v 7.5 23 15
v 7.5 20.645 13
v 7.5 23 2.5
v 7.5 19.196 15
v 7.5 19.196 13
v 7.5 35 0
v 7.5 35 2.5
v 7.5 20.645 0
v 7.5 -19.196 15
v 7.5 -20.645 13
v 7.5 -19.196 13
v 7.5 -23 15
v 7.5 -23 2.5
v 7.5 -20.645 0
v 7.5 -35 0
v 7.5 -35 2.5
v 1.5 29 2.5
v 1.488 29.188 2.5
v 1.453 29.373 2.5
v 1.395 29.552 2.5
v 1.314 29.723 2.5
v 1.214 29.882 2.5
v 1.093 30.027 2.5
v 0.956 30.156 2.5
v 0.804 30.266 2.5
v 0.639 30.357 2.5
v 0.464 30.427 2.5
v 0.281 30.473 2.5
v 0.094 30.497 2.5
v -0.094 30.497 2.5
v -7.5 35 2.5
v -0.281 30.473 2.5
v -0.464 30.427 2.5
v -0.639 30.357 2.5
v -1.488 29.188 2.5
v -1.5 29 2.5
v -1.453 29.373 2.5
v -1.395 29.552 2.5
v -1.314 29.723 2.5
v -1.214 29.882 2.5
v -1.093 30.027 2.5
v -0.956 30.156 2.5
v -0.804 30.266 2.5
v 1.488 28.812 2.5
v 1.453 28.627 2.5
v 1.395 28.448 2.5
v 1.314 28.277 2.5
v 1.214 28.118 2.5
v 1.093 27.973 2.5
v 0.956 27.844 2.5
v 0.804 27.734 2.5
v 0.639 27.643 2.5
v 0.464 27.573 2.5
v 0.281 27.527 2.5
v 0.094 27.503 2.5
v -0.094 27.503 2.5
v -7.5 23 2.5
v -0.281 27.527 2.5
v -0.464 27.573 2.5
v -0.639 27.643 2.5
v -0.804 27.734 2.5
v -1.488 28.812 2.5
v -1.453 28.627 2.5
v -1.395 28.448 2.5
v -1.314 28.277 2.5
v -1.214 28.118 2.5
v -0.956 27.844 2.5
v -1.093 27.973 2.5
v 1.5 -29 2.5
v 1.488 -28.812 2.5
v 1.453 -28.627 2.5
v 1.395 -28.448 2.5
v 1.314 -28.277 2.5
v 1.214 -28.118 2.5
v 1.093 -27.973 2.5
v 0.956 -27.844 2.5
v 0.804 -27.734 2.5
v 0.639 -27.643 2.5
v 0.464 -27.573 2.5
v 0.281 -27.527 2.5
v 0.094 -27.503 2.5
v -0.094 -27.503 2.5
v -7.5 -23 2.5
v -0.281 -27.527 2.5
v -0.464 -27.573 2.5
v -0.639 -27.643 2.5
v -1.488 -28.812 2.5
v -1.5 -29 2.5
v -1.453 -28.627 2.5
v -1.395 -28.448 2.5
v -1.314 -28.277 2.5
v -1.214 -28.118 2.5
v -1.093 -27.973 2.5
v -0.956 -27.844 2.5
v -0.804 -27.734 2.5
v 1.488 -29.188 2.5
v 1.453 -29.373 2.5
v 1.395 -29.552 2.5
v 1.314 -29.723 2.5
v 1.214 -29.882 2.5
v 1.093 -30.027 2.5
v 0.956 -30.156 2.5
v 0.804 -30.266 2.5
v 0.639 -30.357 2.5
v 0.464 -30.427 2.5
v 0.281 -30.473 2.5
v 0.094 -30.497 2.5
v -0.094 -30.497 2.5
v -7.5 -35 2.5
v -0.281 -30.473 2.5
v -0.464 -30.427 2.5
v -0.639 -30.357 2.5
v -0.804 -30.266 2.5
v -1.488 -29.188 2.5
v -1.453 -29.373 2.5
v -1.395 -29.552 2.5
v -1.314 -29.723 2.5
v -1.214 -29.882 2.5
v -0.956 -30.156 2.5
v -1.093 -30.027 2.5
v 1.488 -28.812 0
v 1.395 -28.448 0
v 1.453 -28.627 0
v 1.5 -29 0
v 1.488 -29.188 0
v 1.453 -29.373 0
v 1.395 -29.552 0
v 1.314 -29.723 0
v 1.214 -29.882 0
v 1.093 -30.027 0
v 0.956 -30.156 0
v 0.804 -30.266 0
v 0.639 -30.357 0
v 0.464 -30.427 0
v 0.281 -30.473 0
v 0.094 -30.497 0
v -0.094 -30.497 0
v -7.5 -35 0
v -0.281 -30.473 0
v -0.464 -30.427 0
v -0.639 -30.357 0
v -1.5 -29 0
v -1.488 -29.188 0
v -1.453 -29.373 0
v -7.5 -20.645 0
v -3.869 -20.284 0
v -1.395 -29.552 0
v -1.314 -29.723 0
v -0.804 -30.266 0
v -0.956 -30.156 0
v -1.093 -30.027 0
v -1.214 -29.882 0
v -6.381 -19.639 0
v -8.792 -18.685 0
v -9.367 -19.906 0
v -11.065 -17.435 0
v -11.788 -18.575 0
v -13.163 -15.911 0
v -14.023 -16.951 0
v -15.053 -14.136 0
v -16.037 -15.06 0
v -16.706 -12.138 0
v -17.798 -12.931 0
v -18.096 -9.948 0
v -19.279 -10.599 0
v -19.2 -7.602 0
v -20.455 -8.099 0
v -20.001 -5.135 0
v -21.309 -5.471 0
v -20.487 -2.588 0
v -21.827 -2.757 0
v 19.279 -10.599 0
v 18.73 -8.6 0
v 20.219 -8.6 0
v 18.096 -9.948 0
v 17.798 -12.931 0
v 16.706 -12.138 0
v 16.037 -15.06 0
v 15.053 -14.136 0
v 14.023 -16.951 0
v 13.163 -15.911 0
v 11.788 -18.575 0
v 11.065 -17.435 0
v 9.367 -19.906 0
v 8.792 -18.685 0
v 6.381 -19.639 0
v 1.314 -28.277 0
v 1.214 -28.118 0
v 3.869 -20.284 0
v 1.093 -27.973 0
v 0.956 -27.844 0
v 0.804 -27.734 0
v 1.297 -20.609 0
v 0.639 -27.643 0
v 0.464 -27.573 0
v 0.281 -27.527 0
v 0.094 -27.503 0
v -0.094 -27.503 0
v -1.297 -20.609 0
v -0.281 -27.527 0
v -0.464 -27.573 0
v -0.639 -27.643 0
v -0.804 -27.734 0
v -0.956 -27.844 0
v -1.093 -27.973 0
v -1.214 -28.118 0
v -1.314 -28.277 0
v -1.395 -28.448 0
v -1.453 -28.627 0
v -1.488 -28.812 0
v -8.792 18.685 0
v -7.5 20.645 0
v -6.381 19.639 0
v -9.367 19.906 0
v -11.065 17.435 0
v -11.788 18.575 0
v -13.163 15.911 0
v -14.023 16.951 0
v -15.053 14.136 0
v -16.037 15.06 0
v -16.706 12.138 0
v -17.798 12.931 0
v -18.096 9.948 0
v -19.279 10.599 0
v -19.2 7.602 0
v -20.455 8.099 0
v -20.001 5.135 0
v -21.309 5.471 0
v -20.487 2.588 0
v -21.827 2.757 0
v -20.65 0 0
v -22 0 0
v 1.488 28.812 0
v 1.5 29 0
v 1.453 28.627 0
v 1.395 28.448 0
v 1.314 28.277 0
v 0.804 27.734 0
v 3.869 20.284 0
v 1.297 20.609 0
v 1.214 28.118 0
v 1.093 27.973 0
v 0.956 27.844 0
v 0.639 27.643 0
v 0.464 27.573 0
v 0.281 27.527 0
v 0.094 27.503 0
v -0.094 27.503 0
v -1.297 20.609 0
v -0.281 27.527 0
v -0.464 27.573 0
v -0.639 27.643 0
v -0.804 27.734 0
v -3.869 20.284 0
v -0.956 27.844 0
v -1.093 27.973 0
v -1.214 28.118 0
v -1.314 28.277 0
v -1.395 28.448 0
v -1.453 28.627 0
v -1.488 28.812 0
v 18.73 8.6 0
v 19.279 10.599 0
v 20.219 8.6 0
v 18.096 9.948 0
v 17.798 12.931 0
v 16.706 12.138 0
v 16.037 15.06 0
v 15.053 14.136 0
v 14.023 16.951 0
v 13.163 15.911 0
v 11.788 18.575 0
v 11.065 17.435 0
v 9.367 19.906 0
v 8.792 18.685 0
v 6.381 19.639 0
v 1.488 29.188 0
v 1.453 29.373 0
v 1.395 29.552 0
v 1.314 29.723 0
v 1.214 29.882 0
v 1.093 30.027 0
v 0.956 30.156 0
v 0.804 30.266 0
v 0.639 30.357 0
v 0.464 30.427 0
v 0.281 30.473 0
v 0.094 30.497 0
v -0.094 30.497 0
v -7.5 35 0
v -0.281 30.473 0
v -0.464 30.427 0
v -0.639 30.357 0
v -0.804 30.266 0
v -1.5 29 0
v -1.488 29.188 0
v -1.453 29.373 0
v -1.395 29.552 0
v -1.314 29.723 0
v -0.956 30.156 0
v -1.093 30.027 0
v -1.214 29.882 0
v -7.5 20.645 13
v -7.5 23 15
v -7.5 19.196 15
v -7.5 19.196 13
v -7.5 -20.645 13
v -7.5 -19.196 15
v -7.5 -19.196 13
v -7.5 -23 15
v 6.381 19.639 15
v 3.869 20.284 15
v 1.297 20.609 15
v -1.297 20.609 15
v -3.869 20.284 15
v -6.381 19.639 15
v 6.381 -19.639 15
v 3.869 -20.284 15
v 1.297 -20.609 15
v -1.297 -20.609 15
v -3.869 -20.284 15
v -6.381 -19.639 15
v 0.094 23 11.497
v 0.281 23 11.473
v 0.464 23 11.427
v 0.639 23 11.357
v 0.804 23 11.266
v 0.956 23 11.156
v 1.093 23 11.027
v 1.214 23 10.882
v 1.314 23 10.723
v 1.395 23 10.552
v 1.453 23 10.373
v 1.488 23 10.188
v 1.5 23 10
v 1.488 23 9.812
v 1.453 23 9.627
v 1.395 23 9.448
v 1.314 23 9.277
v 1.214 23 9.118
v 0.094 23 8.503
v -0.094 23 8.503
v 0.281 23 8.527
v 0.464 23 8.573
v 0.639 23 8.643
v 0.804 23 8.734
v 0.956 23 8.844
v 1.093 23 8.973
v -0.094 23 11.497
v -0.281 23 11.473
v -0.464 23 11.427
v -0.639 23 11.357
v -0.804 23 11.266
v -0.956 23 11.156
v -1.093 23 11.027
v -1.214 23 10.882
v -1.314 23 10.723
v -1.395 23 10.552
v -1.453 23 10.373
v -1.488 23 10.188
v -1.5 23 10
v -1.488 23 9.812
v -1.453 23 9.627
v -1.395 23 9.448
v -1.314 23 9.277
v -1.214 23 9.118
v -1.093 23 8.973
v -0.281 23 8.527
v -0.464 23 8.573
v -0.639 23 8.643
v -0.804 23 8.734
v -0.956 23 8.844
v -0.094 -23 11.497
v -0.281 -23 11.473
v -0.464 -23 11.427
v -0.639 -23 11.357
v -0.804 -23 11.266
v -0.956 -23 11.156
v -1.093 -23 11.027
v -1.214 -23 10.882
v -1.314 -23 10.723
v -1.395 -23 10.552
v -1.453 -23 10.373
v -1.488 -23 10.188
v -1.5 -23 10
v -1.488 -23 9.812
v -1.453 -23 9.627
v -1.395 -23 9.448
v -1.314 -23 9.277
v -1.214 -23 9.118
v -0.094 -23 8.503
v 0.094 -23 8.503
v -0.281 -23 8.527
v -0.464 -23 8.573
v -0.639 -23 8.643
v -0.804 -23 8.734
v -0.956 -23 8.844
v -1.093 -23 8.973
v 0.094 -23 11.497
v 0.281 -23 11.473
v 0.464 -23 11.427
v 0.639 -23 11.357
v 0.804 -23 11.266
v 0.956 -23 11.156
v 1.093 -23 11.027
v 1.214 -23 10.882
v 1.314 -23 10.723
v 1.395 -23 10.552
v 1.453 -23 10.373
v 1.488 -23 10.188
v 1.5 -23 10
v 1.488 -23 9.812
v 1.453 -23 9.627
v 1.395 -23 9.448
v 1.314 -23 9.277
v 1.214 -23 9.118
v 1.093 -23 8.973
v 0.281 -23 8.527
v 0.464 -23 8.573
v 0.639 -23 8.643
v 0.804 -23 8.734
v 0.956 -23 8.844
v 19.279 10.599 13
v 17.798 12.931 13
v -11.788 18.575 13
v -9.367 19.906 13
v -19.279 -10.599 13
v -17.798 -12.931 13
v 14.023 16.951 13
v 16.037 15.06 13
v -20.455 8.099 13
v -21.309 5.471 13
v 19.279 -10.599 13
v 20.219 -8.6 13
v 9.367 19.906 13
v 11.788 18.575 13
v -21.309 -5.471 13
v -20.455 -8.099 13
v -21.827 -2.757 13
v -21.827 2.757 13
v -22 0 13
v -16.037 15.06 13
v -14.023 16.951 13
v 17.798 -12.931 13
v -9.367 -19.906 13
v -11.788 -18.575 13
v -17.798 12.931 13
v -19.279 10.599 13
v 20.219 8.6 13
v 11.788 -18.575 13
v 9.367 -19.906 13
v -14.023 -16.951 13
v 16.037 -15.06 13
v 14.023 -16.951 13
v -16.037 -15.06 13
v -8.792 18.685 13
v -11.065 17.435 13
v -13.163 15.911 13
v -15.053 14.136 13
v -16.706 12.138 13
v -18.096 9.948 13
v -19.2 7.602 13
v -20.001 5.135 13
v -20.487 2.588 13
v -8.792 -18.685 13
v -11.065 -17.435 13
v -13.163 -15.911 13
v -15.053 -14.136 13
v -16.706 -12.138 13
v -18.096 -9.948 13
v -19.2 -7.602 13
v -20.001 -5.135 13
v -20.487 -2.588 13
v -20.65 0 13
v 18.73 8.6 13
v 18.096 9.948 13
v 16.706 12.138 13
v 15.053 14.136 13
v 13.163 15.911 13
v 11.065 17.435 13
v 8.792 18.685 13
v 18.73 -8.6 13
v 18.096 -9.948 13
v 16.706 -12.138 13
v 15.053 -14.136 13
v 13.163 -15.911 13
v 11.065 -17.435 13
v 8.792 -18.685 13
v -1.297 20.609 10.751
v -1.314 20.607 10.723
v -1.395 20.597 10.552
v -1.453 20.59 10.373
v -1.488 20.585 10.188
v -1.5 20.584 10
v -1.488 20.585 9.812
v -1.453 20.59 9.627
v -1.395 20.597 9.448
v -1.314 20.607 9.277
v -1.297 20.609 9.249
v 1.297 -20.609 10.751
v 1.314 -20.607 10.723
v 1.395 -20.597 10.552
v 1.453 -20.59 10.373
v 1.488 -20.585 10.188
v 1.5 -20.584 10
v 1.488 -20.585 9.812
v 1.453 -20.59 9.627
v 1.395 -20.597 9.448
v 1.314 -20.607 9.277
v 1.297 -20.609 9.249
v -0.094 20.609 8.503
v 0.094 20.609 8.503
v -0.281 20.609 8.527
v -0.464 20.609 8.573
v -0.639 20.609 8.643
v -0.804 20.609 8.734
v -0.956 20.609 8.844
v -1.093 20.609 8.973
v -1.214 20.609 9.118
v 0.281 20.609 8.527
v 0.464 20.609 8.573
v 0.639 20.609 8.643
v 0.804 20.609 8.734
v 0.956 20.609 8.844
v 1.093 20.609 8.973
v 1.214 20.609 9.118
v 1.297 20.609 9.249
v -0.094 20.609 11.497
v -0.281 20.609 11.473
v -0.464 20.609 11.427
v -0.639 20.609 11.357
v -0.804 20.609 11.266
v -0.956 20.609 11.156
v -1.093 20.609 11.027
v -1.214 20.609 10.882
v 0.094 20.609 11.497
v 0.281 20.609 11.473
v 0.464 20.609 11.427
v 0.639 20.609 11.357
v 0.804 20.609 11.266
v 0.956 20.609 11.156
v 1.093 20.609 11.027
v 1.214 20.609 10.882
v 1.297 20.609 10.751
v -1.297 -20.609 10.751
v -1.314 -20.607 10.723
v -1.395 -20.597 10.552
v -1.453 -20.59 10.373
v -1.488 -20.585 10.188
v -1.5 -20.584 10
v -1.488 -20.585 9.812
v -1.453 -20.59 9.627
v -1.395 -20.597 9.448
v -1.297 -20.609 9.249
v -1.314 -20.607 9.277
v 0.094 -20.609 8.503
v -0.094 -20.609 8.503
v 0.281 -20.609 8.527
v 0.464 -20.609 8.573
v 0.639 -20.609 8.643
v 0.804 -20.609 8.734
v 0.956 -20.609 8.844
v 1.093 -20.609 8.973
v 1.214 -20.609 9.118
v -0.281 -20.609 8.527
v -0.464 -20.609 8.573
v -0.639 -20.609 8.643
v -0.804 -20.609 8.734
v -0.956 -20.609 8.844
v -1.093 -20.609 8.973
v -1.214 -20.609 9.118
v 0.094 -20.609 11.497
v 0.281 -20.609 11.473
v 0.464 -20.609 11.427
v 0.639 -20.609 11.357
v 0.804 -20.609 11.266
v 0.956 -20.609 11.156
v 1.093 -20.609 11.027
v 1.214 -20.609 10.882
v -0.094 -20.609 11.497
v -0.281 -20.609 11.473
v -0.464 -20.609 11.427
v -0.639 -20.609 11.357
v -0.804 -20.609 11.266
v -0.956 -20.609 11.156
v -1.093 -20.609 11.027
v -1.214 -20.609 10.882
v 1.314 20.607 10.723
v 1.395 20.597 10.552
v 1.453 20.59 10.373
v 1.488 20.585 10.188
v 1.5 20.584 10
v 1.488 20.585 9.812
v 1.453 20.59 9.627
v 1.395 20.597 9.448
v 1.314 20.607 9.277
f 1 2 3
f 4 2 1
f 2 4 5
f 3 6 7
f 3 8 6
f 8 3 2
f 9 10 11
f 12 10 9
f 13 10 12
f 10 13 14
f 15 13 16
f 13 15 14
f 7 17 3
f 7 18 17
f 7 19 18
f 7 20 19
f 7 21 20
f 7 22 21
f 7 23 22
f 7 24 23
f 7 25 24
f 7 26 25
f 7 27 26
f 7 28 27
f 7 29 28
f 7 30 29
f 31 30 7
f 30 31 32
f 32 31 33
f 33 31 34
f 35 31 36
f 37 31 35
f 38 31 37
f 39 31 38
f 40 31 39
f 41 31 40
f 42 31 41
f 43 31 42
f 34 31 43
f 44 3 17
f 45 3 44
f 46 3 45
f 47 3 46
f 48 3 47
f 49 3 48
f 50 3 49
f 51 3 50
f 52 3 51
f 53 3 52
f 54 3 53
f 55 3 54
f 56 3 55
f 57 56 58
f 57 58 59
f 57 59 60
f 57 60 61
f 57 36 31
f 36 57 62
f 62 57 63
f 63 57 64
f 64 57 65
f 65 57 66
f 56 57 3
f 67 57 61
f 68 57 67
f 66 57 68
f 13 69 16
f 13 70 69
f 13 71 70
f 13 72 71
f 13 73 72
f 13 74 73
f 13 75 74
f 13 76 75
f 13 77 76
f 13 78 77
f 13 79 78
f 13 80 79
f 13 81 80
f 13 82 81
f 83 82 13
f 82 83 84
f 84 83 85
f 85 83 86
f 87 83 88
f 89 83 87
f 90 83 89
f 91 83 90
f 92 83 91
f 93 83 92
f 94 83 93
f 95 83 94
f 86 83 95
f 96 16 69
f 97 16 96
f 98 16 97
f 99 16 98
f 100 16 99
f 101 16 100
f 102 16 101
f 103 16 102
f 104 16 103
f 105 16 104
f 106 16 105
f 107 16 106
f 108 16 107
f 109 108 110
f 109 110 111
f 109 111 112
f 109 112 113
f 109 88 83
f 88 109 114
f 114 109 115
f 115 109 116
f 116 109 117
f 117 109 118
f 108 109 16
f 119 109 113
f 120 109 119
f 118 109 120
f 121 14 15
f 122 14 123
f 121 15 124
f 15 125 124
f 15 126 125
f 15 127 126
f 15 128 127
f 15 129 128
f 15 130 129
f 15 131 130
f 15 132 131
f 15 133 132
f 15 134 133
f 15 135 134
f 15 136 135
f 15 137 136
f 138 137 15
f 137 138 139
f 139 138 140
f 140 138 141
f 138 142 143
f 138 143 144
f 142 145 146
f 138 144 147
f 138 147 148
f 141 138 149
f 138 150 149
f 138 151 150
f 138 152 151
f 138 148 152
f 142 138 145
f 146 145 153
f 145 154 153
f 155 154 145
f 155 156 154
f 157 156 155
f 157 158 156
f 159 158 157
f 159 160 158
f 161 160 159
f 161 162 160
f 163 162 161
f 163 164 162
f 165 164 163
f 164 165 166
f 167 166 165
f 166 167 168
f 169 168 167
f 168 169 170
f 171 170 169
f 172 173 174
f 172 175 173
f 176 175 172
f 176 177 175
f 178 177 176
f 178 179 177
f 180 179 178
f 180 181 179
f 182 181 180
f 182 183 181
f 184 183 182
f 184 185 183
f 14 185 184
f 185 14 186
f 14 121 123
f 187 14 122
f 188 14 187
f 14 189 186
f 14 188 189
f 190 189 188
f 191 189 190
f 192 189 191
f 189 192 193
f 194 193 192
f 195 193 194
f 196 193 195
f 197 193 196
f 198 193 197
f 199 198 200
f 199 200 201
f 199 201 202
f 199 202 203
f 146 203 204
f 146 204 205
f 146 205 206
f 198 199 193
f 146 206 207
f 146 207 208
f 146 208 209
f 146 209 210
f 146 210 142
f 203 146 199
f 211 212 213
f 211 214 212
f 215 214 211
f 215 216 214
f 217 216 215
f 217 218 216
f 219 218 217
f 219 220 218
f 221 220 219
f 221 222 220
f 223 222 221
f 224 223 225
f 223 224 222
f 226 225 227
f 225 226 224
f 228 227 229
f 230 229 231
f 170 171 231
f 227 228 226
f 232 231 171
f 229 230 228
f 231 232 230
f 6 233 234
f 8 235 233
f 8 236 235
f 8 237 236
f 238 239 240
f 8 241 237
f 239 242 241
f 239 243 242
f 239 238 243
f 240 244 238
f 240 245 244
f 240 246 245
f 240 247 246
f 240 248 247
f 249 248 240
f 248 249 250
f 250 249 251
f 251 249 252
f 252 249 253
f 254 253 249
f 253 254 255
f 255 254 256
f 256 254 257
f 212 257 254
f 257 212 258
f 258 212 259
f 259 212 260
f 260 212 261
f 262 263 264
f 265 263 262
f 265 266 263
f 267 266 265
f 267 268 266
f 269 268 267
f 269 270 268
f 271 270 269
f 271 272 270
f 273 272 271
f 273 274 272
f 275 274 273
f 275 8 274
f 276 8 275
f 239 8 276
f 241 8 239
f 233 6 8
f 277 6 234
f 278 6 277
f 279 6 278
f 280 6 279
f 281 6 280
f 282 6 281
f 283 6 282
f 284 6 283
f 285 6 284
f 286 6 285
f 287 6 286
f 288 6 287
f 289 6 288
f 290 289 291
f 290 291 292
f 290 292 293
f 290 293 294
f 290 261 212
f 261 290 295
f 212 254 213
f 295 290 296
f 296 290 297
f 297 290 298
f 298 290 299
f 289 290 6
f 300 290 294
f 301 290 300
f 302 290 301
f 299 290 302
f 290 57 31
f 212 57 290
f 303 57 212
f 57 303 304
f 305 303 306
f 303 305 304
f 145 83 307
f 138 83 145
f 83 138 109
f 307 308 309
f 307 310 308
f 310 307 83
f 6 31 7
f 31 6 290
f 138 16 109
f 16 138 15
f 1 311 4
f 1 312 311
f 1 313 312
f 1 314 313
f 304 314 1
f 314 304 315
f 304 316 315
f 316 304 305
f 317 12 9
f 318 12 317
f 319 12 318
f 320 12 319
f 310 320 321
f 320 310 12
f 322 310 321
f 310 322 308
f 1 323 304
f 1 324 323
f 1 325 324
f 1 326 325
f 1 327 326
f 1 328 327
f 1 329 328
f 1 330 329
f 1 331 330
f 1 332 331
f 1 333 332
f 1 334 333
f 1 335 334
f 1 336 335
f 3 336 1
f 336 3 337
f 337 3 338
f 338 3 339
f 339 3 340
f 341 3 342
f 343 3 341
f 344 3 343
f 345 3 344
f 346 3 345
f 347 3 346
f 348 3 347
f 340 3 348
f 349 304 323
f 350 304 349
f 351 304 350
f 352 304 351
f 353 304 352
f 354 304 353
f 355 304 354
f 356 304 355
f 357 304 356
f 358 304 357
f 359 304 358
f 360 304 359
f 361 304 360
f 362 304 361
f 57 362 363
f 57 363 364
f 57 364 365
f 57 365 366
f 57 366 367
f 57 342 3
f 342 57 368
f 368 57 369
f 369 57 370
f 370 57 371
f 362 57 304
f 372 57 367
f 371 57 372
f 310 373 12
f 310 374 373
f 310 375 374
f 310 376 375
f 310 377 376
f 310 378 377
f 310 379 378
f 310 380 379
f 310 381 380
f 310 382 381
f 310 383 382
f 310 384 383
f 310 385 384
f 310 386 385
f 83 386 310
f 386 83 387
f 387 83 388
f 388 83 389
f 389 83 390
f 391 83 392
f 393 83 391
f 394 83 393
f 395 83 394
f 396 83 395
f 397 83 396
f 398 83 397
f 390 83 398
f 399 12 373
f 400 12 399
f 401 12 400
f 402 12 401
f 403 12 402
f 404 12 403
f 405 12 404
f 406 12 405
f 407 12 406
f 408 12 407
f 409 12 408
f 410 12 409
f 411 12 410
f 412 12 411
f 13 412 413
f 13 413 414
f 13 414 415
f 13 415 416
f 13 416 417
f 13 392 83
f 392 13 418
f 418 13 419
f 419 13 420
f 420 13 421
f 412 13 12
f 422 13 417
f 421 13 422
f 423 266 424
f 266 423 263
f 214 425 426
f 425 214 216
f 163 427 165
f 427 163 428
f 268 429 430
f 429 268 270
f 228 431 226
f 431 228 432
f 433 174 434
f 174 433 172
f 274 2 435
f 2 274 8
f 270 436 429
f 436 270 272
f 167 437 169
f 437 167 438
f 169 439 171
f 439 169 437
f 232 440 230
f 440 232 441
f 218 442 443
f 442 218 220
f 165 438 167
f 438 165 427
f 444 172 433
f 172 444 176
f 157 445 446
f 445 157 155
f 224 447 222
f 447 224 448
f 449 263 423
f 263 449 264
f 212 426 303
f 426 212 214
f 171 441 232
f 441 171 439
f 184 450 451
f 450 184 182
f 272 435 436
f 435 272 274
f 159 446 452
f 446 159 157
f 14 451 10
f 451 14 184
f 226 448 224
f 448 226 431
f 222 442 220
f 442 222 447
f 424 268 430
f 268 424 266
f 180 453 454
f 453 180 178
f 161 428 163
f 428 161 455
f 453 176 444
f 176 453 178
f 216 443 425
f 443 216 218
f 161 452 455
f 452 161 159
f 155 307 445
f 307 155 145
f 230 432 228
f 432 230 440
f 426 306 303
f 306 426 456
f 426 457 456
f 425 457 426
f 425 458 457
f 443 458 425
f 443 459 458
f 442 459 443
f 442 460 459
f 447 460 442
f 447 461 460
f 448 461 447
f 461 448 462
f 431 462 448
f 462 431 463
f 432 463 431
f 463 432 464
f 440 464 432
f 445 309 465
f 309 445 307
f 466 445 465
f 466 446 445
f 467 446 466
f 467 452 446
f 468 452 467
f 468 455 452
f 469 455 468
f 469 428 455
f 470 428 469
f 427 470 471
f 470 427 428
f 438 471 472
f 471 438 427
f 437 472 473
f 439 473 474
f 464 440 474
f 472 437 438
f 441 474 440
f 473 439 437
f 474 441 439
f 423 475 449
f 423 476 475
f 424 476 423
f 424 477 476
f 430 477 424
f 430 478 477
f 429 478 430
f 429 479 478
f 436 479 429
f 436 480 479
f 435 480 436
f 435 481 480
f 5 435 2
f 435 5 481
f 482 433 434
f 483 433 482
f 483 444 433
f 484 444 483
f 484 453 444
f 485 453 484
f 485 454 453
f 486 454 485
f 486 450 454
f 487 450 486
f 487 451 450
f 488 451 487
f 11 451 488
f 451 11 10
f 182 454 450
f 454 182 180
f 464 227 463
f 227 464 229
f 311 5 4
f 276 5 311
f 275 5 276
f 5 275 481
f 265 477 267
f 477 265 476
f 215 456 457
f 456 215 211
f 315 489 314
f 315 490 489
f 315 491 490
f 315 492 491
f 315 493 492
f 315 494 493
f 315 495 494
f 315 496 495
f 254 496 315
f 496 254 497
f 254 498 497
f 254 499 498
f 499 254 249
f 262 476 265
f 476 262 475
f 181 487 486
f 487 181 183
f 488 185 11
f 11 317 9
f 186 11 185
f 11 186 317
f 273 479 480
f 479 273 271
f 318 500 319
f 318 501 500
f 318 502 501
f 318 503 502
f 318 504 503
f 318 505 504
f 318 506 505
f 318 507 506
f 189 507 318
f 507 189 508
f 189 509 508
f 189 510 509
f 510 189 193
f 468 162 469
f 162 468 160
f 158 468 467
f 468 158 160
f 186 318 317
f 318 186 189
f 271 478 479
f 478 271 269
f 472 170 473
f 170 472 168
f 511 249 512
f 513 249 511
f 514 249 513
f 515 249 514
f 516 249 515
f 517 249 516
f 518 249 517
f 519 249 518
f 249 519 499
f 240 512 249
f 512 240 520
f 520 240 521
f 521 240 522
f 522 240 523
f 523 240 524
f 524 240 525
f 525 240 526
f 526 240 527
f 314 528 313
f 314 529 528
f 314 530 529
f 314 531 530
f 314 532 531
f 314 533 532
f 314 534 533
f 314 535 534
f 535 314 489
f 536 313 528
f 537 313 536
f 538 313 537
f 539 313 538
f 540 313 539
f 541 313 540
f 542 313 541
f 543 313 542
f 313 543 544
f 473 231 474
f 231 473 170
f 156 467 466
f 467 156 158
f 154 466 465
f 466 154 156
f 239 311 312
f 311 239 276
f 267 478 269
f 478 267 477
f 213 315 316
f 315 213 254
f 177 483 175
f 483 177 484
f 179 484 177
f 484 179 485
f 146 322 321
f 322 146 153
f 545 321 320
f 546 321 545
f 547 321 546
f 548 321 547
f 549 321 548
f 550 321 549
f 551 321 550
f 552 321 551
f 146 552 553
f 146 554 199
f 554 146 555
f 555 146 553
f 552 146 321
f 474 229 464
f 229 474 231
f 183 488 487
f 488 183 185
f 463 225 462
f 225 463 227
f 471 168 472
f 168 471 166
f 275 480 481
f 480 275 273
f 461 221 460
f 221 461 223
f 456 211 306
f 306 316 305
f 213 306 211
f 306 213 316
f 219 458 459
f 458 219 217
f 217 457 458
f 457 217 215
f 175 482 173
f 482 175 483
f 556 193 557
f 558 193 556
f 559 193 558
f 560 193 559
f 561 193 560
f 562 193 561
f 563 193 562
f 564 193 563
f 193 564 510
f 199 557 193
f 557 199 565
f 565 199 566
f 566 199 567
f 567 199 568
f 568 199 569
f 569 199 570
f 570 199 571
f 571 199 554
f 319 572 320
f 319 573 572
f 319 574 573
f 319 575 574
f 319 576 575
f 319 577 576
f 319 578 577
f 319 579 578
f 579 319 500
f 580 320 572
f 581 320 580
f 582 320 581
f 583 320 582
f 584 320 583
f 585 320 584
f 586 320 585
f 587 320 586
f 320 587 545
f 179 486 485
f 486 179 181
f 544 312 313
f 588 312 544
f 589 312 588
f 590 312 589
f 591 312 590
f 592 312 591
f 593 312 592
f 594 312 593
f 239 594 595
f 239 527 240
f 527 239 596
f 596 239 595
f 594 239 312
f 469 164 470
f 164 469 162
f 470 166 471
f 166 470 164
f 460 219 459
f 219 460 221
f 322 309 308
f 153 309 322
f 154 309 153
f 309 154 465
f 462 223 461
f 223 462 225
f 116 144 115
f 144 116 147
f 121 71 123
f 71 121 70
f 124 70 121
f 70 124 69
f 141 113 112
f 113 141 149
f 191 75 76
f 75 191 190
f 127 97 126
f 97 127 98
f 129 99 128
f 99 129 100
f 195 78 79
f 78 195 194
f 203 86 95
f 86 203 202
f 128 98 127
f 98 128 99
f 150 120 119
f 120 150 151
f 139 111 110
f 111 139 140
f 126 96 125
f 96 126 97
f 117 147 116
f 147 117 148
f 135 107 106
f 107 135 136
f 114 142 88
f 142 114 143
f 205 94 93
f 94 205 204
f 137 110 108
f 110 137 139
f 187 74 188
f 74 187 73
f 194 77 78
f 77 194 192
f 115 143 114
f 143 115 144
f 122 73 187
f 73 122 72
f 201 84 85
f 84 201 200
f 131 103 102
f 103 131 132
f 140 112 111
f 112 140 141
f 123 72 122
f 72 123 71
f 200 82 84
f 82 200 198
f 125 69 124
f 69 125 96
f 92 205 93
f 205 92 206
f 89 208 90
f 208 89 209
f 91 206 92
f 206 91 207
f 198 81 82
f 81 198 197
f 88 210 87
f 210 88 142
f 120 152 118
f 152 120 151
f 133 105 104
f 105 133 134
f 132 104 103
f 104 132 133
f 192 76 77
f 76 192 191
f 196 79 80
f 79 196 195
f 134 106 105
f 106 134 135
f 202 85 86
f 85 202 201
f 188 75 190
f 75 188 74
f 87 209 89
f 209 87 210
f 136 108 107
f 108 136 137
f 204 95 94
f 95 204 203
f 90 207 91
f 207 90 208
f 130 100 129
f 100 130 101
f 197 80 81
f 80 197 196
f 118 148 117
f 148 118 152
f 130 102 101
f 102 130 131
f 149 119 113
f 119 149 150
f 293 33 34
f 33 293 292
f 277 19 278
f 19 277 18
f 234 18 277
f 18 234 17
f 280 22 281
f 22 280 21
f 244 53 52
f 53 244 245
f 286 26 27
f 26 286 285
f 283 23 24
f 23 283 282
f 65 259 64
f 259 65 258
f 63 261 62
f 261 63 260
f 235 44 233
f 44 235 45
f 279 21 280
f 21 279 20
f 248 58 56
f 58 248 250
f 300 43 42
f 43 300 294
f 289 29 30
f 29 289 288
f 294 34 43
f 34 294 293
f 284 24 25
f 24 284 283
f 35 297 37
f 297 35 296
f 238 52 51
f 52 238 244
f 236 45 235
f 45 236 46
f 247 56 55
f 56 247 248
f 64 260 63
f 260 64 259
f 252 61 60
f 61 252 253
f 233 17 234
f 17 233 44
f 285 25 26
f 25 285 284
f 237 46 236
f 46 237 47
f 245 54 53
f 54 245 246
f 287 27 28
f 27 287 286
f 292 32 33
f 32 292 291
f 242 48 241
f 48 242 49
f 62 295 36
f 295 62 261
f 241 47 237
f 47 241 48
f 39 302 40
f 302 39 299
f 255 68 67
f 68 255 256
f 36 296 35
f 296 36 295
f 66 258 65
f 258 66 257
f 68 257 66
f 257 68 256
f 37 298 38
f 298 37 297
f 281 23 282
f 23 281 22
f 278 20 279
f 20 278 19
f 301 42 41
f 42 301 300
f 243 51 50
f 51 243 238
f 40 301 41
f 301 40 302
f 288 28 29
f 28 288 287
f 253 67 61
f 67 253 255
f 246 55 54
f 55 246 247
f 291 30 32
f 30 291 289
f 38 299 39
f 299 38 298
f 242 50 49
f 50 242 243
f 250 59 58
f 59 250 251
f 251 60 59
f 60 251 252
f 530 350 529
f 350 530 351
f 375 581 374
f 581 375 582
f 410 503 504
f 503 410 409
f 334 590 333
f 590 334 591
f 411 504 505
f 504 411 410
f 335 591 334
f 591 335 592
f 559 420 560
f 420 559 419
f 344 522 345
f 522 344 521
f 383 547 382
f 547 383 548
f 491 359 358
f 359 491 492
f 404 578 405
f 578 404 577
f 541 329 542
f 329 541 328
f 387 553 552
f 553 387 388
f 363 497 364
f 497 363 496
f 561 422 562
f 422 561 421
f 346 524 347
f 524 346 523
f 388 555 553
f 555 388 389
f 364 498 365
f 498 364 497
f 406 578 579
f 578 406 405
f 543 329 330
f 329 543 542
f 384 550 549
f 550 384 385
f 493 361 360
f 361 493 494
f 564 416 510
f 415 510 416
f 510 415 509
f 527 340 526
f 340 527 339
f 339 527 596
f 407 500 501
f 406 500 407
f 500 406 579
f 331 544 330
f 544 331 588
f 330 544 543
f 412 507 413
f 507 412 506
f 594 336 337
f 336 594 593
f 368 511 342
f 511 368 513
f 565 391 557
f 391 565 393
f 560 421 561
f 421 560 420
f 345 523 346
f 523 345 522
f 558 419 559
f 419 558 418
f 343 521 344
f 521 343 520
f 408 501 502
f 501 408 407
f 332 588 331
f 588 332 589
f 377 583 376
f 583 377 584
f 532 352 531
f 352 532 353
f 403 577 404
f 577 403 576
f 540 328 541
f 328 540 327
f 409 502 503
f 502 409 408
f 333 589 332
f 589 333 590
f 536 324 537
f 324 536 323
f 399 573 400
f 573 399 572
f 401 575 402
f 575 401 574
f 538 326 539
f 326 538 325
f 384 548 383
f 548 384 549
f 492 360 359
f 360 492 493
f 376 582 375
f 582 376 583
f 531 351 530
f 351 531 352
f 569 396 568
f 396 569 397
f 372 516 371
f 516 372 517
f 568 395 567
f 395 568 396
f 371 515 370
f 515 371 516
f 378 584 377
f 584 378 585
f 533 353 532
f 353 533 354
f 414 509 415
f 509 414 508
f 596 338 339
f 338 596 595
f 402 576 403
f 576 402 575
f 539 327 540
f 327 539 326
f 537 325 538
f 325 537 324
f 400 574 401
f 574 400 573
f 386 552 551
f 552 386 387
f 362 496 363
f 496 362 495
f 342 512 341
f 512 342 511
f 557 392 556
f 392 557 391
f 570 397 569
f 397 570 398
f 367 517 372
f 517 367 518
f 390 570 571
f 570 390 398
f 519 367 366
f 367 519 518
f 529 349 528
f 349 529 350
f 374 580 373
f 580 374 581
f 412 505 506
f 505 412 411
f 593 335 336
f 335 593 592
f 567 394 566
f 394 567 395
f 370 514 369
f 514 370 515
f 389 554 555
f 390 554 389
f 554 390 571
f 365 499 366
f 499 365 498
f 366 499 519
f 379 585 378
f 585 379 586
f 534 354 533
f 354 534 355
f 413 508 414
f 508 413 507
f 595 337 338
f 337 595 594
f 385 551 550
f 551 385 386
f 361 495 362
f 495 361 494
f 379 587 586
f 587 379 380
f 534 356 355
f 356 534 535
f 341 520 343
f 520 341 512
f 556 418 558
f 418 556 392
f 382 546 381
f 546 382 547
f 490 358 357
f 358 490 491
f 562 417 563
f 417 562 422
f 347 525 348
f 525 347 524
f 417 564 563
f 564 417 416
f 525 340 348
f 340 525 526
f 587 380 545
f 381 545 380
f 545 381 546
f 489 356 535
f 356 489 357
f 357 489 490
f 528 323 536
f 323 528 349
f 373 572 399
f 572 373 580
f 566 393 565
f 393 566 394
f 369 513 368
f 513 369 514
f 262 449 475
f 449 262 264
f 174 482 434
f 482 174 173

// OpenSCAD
$fn=50;

difference()
{
	union()
	{
		translate([-7.5,-35,0]) cube([15,70,2.5]);
		translate([-7.5,-23,0]) cube([15,46,15]);
		cylinder(d=44,h=13);
	}
	translate([0,0,-0.5])cylinder(d=41.3,h=22);
	translate([0,-29,-1])cylinder(d=3,h=5);
	translate([0,29,-1])cylinder(d=3,h=5);
	translate([0,25,10]) rotate([90,0,0]) cylinder(d=3,h=50);
	translate([15,-8.6,-1]) cube(17.2);
}
